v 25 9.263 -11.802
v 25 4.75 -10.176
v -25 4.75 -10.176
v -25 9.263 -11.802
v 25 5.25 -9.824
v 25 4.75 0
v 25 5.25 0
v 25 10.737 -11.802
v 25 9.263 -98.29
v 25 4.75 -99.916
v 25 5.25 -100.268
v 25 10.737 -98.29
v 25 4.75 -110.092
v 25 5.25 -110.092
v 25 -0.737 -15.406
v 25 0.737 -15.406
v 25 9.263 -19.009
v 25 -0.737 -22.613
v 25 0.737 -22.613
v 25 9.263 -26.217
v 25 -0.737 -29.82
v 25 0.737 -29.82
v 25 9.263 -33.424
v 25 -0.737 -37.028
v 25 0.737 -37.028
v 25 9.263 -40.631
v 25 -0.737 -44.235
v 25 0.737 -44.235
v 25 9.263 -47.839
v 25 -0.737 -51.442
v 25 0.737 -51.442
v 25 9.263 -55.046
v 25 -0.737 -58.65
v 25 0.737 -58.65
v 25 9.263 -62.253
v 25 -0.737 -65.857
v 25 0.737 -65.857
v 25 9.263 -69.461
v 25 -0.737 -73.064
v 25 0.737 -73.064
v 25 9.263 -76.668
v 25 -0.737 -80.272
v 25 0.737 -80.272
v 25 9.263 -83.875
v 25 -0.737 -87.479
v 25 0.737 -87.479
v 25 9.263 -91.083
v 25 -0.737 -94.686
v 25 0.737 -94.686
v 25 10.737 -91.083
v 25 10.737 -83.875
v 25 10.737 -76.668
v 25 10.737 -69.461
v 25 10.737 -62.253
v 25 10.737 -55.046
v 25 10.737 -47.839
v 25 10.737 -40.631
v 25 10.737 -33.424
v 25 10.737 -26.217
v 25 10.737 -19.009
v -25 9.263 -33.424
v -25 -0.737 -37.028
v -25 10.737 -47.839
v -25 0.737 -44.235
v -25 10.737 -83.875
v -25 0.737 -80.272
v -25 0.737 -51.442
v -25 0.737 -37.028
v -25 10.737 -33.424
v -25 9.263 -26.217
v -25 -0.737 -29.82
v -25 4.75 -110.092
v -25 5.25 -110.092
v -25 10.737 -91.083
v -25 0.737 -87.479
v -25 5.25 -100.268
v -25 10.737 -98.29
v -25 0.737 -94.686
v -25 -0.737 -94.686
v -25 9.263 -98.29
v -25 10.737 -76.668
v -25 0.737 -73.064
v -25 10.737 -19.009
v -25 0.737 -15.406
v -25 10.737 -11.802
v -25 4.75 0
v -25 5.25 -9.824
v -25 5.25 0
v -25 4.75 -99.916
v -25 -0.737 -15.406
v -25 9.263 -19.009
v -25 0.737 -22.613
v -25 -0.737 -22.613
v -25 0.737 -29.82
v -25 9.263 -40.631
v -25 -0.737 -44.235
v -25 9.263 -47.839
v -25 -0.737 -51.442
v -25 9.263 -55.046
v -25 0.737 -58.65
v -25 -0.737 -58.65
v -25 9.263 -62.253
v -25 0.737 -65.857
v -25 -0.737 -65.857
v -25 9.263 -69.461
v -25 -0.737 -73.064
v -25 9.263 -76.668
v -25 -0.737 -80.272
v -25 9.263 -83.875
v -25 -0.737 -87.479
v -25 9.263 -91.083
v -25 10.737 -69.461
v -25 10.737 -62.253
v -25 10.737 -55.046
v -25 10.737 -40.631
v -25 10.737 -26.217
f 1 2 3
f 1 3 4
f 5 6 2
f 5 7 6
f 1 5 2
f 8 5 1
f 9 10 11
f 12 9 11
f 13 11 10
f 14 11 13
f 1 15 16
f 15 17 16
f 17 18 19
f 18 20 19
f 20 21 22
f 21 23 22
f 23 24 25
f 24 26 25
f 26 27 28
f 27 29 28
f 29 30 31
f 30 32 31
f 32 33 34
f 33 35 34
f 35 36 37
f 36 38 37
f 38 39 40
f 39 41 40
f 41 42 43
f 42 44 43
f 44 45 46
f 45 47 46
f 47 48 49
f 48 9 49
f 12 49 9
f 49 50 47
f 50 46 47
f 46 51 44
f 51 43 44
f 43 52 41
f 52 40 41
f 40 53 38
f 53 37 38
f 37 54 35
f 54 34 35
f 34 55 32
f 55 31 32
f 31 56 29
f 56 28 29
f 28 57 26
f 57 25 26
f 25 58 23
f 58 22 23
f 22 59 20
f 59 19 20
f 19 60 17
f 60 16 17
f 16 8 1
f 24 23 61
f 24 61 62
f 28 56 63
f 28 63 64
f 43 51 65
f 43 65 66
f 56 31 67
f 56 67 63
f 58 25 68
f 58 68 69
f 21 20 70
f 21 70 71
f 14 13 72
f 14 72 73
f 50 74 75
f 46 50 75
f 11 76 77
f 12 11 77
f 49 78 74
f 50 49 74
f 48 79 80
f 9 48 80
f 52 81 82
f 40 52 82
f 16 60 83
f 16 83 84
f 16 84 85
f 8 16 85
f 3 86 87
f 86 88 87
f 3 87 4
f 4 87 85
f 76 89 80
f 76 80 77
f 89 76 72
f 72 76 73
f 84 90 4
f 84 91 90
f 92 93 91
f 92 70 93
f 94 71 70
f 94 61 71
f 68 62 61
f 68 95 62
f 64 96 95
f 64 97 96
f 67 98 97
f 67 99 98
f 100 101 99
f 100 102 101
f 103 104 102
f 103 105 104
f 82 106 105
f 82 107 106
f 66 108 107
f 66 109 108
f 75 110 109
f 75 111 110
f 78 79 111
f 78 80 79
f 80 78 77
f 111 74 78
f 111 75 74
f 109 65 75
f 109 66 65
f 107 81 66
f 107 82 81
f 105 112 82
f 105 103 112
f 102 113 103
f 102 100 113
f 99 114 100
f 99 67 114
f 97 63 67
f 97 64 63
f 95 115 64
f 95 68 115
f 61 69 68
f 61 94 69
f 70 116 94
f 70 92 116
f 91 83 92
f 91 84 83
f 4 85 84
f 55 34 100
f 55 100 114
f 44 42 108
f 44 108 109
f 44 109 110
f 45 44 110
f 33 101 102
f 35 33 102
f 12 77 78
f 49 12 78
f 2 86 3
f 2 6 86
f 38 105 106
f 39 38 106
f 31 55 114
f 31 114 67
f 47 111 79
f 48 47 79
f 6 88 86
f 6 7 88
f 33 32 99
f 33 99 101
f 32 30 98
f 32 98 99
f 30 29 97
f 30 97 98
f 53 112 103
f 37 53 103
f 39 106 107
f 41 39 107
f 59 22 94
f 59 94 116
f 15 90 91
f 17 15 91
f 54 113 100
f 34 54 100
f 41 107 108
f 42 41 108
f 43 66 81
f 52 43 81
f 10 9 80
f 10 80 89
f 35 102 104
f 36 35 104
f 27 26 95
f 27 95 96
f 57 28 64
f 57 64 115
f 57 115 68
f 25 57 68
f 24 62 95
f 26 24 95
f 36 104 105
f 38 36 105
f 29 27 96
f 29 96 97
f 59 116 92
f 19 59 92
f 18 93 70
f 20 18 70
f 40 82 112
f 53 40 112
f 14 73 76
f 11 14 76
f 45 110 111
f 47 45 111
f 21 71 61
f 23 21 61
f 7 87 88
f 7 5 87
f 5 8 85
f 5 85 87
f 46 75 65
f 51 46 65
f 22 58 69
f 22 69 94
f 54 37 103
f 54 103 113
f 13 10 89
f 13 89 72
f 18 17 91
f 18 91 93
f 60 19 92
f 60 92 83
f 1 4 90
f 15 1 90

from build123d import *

# Parameters (mm, degrees)
EXTRUDE_THIN1_DEPTH = 25


with BuildPart() as part:
    # Sketch3 → Extrude-Thin1 (new body, symmetric)
    with BuildSketch(Plane(origin=(0, 0, 0), x_dir=(0, 0, -1), z_dir=(1, 0, 0))):
        Polygon((0, 4.75), (10.175645864, 4.75), (11.801837516, 9.26259239), (15.405512547, -0.73740761), (19.009187578, 9.26259239), (22.612862609, -0.73740761), (26.21653764, 9.26259239), (29.820212671, -0.73740761), (33.423887702, 9.26259239), (37.027562733, -0.73740761), (40.631237764, 9.26259239), (44.234912795, -0.73740761), (47.838587827, 9.26259239), (51.442262858, -0.73740761), (55.045937889, 9.26259239), (58.64961292, -0.73740761), (62.253287951, 9.26259239), (65.856962982, -0.73740761), (69.460638013, 9.26259239), (73.064313044, -0.73740761), (76.667988075, 9.26259239), (80.271663106, -0.73740761), (83.875338138, 9.26259239), (87.479013169, -0.73740761), (91.0826882, 9.26259239), (94.686363231, -0.73740761), (98.290038262, 9.26259239), (99.916229914, 4.75), (110.091875777, 4.75), (110.091875777, 5.25), (100.267521641, 5.25), (98.290038262, 10.73740761), (94.686363231, 0.73740761), (91.0826882, 10.73740761), (87.479013169, 0.73740761), (83.875338138, 10.73740761), (80.271663106, 0.73740761), (76.667988075, 10.73740761), (73.064313044, 0.73740761), (69.460638013, 10.73740761), (65.856962982, 0.73740761), (62.253287951, 10.73740761), (58.64961292, 0.73740761), (55.045937889, 10.73740761), (51.442262858, 0.73740761), (47.838587827, 10.73740761), (44.234912795, 0.73740761), (40.631237764, 10.73740761), (37.027562733, 0.73740761), (33.423887702, 10.73740761), (29.820212671, 0.73740761), (26.21653764, 10.73740761), (22.612862609, 0.73740761), (19.009187578, 10.73740761), (15.405512547, 0.73740761), (11.801837516, 10.73740761), (9.824354136, 5.25), (0, 5.25), align=None)
    extrude(amount=EXTRUDE_THIN1_DEPTH, both=True)


solid = part.part
